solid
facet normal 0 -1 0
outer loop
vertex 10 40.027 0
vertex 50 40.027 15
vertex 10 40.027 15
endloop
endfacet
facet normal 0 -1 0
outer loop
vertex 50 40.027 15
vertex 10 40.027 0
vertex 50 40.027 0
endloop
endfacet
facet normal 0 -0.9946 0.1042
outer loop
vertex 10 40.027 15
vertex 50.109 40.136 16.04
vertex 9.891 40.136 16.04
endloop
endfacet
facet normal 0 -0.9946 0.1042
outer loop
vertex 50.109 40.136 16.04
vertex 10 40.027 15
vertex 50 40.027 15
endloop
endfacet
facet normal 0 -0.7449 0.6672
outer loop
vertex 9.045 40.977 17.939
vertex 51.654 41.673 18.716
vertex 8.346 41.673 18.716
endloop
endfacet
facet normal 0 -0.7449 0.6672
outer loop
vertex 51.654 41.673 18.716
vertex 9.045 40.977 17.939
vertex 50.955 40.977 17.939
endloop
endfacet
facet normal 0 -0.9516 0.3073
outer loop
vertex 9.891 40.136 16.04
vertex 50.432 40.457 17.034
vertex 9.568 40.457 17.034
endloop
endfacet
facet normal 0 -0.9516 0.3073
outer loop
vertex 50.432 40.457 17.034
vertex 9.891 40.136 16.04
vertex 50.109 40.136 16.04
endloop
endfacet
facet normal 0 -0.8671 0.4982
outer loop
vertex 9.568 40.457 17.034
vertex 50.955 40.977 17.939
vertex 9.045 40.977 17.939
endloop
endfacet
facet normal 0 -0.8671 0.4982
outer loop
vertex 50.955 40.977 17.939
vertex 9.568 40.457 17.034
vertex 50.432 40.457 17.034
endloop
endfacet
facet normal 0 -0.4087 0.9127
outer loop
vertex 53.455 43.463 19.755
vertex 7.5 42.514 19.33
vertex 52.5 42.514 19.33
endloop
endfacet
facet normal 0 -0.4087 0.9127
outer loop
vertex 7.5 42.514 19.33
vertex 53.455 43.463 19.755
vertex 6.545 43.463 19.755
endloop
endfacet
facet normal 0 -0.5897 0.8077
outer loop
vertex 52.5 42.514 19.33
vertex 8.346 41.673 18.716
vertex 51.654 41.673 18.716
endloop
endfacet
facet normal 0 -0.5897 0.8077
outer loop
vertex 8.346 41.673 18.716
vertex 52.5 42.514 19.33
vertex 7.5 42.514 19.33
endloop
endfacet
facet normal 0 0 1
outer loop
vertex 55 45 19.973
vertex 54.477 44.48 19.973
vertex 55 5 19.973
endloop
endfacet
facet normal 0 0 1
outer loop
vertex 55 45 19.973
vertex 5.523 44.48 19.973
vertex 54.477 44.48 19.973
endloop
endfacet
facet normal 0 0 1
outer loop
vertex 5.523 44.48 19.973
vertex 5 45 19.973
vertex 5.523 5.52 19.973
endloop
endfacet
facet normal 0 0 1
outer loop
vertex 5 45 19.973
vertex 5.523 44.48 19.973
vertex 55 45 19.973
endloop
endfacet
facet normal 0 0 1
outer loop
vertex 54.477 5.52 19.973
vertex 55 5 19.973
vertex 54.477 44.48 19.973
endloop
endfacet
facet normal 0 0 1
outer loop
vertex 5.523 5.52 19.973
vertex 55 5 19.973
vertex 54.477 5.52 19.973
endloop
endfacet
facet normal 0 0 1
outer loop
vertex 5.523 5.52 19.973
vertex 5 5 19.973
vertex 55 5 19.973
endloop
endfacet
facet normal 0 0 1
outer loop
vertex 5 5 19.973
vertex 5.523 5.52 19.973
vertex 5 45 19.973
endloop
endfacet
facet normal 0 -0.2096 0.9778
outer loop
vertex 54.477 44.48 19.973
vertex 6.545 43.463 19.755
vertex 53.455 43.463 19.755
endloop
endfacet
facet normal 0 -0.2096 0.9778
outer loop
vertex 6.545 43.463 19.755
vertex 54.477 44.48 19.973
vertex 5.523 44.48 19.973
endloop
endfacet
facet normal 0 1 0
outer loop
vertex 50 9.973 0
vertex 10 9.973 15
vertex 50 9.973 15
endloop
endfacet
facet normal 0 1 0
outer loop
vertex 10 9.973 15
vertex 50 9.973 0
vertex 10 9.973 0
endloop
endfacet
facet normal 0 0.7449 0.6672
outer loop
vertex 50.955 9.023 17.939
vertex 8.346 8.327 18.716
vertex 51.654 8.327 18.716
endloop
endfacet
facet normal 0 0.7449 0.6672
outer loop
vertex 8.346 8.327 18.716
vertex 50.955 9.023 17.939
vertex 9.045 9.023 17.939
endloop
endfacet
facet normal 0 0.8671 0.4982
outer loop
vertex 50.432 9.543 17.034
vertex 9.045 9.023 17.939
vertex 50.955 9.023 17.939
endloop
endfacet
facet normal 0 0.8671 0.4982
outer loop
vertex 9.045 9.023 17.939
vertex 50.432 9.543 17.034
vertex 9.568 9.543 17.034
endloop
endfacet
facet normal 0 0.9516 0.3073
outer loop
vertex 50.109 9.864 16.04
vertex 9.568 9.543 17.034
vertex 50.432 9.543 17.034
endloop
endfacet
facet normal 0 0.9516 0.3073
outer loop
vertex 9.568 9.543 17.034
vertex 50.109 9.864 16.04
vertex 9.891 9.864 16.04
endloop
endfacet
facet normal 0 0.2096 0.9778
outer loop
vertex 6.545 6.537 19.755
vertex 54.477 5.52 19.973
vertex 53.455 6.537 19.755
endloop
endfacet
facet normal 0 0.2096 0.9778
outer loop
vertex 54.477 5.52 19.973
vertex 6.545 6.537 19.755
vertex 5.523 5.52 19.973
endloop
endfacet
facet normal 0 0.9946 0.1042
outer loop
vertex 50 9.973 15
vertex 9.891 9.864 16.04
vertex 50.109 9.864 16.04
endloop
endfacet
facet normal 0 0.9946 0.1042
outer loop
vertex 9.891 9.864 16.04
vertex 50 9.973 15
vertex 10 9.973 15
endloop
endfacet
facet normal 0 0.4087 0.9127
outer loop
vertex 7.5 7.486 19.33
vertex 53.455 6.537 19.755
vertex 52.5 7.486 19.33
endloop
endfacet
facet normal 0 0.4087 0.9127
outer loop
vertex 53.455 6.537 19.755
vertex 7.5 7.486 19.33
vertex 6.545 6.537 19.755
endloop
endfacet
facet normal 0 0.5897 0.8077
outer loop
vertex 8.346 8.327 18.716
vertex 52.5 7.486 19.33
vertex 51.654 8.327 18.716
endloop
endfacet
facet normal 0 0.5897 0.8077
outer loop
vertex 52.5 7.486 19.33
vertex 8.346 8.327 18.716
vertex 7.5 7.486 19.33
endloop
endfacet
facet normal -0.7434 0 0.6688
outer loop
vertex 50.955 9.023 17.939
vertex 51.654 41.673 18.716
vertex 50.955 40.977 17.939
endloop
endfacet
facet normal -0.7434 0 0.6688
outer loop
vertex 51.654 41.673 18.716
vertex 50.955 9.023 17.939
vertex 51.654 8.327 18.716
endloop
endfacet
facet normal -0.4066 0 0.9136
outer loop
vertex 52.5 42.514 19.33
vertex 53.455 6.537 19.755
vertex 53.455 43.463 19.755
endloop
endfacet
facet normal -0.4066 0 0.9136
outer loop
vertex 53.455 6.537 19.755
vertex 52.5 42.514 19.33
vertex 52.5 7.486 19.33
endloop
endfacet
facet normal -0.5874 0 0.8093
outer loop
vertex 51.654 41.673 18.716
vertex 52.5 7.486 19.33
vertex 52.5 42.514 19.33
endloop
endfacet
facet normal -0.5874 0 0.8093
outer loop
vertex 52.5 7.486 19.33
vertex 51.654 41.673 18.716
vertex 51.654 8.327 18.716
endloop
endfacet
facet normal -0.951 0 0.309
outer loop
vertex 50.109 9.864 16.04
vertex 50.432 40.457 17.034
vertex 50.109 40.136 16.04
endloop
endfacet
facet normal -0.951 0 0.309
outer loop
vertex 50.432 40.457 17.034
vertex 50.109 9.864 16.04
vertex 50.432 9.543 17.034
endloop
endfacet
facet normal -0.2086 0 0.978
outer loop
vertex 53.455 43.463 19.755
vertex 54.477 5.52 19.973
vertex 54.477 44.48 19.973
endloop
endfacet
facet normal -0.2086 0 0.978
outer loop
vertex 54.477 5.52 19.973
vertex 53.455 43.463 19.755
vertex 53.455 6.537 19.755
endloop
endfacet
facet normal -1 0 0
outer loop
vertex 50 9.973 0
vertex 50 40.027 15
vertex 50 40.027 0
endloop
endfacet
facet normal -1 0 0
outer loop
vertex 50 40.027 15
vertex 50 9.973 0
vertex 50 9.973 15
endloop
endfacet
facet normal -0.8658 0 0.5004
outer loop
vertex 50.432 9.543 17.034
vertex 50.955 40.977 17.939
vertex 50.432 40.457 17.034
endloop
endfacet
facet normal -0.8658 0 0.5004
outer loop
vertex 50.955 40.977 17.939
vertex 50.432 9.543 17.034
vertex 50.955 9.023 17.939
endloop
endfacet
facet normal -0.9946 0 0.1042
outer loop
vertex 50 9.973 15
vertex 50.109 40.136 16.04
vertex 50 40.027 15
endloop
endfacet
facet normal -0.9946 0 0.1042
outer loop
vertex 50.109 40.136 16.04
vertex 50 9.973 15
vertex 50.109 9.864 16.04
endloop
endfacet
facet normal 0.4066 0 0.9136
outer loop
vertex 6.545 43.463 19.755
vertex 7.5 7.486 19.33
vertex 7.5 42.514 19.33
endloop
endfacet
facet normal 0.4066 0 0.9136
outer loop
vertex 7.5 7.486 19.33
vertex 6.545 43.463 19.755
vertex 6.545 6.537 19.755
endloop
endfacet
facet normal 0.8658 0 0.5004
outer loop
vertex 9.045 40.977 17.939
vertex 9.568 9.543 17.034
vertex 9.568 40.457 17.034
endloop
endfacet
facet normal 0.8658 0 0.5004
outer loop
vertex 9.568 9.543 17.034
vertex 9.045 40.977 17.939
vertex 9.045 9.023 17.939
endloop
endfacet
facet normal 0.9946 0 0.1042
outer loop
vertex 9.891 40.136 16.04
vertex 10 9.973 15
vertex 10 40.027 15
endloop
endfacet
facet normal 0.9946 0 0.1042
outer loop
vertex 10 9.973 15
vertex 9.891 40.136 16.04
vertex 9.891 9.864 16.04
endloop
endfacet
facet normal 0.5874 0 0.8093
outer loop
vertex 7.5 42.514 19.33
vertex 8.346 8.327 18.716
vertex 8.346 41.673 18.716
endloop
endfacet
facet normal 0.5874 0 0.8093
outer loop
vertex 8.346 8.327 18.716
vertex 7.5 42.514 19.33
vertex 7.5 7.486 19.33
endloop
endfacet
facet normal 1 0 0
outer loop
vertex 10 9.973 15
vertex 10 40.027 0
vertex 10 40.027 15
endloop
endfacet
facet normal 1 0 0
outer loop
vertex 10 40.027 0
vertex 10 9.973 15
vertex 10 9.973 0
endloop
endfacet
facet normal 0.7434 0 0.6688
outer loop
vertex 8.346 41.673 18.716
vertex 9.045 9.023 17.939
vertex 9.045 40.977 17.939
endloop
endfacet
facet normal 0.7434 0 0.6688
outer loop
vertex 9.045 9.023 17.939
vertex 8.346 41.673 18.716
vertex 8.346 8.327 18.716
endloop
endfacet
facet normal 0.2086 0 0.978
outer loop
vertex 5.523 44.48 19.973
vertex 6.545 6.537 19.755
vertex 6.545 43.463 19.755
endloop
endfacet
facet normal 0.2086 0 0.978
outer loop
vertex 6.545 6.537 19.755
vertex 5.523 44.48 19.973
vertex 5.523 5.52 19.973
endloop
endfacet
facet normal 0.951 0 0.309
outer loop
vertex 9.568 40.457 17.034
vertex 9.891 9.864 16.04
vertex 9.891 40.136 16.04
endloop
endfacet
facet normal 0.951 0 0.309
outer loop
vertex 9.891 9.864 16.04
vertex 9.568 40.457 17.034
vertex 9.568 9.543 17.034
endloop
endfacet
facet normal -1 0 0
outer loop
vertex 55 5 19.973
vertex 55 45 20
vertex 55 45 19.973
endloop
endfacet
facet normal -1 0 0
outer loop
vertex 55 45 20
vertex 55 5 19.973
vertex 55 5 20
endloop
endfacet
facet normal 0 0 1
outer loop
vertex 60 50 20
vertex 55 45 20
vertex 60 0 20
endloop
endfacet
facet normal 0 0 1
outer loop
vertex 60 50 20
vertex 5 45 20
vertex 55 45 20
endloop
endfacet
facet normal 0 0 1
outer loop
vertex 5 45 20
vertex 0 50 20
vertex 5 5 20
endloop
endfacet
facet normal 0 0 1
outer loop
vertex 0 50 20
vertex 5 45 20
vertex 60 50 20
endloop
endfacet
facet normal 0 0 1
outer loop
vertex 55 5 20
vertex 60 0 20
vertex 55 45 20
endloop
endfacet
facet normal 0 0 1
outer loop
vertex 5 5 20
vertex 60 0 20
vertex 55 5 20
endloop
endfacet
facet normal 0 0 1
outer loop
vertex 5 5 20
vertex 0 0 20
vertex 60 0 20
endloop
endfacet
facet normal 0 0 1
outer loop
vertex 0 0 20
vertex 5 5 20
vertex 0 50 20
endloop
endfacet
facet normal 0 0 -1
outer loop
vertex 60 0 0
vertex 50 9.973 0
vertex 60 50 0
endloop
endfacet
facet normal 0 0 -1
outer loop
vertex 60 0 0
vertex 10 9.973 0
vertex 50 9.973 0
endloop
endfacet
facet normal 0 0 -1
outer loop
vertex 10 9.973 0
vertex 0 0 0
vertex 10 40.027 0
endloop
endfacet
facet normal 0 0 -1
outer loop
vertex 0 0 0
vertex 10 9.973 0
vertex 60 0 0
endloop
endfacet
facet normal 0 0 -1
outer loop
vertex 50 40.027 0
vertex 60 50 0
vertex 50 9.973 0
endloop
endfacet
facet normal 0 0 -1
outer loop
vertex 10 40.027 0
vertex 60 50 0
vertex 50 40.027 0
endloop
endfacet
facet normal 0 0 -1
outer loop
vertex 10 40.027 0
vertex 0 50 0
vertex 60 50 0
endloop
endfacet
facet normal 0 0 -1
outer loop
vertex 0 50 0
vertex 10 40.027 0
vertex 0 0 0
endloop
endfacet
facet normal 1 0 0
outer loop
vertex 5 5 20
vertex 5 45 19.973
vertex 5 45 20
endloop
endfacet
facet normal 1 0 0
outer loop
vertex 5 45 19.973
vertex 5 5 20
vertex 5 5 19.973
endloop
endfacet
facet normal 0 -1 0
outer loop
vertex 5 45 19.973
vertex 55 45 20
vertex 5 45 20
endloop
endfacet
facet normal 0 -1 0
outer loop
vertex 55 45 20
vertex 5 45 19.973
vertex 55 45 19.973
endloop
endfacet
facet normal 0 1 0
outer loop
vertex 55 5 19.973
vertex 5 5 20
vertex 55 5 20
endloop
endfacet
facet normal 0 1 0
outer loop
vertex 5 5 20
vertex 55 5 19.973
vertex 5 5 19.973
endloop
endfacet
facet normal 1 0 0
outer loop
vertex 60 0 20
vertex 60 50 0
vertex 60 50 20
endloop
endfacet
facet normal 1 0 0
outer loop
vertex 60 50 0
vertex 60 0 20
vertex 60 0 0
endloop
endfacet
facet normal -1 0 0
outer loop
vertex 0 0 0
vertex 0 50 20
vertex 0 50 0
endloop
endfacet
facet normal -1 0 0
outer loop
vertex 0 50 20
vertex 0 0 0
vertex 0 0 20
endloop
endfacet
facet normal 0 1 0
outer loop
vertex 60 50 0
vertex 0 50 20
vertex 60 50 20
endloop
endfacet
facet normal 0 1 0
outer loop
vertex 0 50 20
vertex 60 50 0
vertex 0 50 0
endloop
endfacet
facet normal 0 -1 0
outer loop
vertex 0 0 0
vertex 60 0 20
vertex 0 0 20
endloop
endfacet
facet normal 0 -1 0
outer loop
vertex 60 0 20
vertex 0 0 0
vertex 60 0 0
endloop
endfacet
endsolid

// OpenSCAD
// file: ../primitives/roundedCube.scad
// Example:
roundedCube(
  x = 30,
  y = 20,
  z = 10,
  r = 3,
  flatBottom = true
);

module roundedCube(
  x,
  y,
  z,
  r = 0,
  flatTop = false,
  flatBottom = false,
  flatLeft = false,
  flatRight = false,
  flatFront = false,
  flatBack = false
) {
  difference() {
    // Main rounded cube:
    translate([
      flatLeft ? 0 : r,
      flatFront ? 0 : r,
      flatBottom ? 0 : r
    ]) {
      minkowski() {
        cube([
          x - r * (flatLeft && flatRight ? 0 : (flatLeft || flatRight ? 1 : 2)),
          y - r * (flatFront && flatBack ? 0 : (flatFront || flatBack ? 1 : 2)),
          z - r * (flatTop && flatBottom ? 0 : (flatTop || flatBottom ? 1 : 2))
        ]);
        sphere(r = r);
      }
    }
    // Optional cutouts:
    // (let's not generate unnecessary geometry)
    if (flatTop) {
      translate([ x / -2, y / -2, z ])
      cube([ x * 2, y * 2, z ]);
    }
    if (flatBottom) {
      translate([ x / -2, y / -2, -z ])
      cube([ x * 2, y * 2, z ]);
    }
    if (flatLeft) {
      translate([ -x, y / -2, z / -2 ])
      cube([ x, y * 2, z * 2 ]);
    }
    if (flatRight) {
      translate([ x, y / -2, z / -2 ])
      cube([ x, y * 2, z * 2 ]);
    }
    if (flatFront) {
      translate([ x / -2, -y, z / -2 ])
      cube([ x * 2, y, z * 2 ]);
    }
    if (flatBack) {
      translate([ x / -2, y, z / -2 ])
      cube([ x * 2, y, z * 2 ]);
    }
  }
}
// main file
use <../primitives/roundedCube.scad>;

// Example:
difference() {
  cube([ 60, 50, 20 ]);
  roundedWindow(
    x = 60,
    y = 50,
    z = 20,
    r = 5,
    padding = 10,
    $fn = 30
  );
}

module roundedWindow(
  x,
  y,
  z,
  r,
  padding = 0
) {
  _x = x - padding * 2;
  _y = y - padding * 2;

  if (_x - r * 2 <= 0) {
    echo("<b style='color: red'>WARNING</b>: roundedWindow() is too small along its x-axis");
  }
  if (_y - r * 2 <= 0) {
    echo("<b style='color: red'>WARNING</b>: roundedWindow() is too small along its y-axis");
  }

  translate([ _x / -2 + padding, _y / -2 + padding, 0 ])
  difference() {
    translate([ _x / 2 - r, _y / 2 - r, 0 ])
    cube([ _x + 2 * r, _y + 2 * r, z ]);
    minkowski() {
      difference() {
        cube([ _x * 2, _y * 2, z - r ]);
        translate([ _x / 2 - r, _y / 2 - r, 0 ])
        cube([ _x + r * 2, _y + r * 2, z + r ]);
      }
      sphere(r = r);
    }
  }
}
